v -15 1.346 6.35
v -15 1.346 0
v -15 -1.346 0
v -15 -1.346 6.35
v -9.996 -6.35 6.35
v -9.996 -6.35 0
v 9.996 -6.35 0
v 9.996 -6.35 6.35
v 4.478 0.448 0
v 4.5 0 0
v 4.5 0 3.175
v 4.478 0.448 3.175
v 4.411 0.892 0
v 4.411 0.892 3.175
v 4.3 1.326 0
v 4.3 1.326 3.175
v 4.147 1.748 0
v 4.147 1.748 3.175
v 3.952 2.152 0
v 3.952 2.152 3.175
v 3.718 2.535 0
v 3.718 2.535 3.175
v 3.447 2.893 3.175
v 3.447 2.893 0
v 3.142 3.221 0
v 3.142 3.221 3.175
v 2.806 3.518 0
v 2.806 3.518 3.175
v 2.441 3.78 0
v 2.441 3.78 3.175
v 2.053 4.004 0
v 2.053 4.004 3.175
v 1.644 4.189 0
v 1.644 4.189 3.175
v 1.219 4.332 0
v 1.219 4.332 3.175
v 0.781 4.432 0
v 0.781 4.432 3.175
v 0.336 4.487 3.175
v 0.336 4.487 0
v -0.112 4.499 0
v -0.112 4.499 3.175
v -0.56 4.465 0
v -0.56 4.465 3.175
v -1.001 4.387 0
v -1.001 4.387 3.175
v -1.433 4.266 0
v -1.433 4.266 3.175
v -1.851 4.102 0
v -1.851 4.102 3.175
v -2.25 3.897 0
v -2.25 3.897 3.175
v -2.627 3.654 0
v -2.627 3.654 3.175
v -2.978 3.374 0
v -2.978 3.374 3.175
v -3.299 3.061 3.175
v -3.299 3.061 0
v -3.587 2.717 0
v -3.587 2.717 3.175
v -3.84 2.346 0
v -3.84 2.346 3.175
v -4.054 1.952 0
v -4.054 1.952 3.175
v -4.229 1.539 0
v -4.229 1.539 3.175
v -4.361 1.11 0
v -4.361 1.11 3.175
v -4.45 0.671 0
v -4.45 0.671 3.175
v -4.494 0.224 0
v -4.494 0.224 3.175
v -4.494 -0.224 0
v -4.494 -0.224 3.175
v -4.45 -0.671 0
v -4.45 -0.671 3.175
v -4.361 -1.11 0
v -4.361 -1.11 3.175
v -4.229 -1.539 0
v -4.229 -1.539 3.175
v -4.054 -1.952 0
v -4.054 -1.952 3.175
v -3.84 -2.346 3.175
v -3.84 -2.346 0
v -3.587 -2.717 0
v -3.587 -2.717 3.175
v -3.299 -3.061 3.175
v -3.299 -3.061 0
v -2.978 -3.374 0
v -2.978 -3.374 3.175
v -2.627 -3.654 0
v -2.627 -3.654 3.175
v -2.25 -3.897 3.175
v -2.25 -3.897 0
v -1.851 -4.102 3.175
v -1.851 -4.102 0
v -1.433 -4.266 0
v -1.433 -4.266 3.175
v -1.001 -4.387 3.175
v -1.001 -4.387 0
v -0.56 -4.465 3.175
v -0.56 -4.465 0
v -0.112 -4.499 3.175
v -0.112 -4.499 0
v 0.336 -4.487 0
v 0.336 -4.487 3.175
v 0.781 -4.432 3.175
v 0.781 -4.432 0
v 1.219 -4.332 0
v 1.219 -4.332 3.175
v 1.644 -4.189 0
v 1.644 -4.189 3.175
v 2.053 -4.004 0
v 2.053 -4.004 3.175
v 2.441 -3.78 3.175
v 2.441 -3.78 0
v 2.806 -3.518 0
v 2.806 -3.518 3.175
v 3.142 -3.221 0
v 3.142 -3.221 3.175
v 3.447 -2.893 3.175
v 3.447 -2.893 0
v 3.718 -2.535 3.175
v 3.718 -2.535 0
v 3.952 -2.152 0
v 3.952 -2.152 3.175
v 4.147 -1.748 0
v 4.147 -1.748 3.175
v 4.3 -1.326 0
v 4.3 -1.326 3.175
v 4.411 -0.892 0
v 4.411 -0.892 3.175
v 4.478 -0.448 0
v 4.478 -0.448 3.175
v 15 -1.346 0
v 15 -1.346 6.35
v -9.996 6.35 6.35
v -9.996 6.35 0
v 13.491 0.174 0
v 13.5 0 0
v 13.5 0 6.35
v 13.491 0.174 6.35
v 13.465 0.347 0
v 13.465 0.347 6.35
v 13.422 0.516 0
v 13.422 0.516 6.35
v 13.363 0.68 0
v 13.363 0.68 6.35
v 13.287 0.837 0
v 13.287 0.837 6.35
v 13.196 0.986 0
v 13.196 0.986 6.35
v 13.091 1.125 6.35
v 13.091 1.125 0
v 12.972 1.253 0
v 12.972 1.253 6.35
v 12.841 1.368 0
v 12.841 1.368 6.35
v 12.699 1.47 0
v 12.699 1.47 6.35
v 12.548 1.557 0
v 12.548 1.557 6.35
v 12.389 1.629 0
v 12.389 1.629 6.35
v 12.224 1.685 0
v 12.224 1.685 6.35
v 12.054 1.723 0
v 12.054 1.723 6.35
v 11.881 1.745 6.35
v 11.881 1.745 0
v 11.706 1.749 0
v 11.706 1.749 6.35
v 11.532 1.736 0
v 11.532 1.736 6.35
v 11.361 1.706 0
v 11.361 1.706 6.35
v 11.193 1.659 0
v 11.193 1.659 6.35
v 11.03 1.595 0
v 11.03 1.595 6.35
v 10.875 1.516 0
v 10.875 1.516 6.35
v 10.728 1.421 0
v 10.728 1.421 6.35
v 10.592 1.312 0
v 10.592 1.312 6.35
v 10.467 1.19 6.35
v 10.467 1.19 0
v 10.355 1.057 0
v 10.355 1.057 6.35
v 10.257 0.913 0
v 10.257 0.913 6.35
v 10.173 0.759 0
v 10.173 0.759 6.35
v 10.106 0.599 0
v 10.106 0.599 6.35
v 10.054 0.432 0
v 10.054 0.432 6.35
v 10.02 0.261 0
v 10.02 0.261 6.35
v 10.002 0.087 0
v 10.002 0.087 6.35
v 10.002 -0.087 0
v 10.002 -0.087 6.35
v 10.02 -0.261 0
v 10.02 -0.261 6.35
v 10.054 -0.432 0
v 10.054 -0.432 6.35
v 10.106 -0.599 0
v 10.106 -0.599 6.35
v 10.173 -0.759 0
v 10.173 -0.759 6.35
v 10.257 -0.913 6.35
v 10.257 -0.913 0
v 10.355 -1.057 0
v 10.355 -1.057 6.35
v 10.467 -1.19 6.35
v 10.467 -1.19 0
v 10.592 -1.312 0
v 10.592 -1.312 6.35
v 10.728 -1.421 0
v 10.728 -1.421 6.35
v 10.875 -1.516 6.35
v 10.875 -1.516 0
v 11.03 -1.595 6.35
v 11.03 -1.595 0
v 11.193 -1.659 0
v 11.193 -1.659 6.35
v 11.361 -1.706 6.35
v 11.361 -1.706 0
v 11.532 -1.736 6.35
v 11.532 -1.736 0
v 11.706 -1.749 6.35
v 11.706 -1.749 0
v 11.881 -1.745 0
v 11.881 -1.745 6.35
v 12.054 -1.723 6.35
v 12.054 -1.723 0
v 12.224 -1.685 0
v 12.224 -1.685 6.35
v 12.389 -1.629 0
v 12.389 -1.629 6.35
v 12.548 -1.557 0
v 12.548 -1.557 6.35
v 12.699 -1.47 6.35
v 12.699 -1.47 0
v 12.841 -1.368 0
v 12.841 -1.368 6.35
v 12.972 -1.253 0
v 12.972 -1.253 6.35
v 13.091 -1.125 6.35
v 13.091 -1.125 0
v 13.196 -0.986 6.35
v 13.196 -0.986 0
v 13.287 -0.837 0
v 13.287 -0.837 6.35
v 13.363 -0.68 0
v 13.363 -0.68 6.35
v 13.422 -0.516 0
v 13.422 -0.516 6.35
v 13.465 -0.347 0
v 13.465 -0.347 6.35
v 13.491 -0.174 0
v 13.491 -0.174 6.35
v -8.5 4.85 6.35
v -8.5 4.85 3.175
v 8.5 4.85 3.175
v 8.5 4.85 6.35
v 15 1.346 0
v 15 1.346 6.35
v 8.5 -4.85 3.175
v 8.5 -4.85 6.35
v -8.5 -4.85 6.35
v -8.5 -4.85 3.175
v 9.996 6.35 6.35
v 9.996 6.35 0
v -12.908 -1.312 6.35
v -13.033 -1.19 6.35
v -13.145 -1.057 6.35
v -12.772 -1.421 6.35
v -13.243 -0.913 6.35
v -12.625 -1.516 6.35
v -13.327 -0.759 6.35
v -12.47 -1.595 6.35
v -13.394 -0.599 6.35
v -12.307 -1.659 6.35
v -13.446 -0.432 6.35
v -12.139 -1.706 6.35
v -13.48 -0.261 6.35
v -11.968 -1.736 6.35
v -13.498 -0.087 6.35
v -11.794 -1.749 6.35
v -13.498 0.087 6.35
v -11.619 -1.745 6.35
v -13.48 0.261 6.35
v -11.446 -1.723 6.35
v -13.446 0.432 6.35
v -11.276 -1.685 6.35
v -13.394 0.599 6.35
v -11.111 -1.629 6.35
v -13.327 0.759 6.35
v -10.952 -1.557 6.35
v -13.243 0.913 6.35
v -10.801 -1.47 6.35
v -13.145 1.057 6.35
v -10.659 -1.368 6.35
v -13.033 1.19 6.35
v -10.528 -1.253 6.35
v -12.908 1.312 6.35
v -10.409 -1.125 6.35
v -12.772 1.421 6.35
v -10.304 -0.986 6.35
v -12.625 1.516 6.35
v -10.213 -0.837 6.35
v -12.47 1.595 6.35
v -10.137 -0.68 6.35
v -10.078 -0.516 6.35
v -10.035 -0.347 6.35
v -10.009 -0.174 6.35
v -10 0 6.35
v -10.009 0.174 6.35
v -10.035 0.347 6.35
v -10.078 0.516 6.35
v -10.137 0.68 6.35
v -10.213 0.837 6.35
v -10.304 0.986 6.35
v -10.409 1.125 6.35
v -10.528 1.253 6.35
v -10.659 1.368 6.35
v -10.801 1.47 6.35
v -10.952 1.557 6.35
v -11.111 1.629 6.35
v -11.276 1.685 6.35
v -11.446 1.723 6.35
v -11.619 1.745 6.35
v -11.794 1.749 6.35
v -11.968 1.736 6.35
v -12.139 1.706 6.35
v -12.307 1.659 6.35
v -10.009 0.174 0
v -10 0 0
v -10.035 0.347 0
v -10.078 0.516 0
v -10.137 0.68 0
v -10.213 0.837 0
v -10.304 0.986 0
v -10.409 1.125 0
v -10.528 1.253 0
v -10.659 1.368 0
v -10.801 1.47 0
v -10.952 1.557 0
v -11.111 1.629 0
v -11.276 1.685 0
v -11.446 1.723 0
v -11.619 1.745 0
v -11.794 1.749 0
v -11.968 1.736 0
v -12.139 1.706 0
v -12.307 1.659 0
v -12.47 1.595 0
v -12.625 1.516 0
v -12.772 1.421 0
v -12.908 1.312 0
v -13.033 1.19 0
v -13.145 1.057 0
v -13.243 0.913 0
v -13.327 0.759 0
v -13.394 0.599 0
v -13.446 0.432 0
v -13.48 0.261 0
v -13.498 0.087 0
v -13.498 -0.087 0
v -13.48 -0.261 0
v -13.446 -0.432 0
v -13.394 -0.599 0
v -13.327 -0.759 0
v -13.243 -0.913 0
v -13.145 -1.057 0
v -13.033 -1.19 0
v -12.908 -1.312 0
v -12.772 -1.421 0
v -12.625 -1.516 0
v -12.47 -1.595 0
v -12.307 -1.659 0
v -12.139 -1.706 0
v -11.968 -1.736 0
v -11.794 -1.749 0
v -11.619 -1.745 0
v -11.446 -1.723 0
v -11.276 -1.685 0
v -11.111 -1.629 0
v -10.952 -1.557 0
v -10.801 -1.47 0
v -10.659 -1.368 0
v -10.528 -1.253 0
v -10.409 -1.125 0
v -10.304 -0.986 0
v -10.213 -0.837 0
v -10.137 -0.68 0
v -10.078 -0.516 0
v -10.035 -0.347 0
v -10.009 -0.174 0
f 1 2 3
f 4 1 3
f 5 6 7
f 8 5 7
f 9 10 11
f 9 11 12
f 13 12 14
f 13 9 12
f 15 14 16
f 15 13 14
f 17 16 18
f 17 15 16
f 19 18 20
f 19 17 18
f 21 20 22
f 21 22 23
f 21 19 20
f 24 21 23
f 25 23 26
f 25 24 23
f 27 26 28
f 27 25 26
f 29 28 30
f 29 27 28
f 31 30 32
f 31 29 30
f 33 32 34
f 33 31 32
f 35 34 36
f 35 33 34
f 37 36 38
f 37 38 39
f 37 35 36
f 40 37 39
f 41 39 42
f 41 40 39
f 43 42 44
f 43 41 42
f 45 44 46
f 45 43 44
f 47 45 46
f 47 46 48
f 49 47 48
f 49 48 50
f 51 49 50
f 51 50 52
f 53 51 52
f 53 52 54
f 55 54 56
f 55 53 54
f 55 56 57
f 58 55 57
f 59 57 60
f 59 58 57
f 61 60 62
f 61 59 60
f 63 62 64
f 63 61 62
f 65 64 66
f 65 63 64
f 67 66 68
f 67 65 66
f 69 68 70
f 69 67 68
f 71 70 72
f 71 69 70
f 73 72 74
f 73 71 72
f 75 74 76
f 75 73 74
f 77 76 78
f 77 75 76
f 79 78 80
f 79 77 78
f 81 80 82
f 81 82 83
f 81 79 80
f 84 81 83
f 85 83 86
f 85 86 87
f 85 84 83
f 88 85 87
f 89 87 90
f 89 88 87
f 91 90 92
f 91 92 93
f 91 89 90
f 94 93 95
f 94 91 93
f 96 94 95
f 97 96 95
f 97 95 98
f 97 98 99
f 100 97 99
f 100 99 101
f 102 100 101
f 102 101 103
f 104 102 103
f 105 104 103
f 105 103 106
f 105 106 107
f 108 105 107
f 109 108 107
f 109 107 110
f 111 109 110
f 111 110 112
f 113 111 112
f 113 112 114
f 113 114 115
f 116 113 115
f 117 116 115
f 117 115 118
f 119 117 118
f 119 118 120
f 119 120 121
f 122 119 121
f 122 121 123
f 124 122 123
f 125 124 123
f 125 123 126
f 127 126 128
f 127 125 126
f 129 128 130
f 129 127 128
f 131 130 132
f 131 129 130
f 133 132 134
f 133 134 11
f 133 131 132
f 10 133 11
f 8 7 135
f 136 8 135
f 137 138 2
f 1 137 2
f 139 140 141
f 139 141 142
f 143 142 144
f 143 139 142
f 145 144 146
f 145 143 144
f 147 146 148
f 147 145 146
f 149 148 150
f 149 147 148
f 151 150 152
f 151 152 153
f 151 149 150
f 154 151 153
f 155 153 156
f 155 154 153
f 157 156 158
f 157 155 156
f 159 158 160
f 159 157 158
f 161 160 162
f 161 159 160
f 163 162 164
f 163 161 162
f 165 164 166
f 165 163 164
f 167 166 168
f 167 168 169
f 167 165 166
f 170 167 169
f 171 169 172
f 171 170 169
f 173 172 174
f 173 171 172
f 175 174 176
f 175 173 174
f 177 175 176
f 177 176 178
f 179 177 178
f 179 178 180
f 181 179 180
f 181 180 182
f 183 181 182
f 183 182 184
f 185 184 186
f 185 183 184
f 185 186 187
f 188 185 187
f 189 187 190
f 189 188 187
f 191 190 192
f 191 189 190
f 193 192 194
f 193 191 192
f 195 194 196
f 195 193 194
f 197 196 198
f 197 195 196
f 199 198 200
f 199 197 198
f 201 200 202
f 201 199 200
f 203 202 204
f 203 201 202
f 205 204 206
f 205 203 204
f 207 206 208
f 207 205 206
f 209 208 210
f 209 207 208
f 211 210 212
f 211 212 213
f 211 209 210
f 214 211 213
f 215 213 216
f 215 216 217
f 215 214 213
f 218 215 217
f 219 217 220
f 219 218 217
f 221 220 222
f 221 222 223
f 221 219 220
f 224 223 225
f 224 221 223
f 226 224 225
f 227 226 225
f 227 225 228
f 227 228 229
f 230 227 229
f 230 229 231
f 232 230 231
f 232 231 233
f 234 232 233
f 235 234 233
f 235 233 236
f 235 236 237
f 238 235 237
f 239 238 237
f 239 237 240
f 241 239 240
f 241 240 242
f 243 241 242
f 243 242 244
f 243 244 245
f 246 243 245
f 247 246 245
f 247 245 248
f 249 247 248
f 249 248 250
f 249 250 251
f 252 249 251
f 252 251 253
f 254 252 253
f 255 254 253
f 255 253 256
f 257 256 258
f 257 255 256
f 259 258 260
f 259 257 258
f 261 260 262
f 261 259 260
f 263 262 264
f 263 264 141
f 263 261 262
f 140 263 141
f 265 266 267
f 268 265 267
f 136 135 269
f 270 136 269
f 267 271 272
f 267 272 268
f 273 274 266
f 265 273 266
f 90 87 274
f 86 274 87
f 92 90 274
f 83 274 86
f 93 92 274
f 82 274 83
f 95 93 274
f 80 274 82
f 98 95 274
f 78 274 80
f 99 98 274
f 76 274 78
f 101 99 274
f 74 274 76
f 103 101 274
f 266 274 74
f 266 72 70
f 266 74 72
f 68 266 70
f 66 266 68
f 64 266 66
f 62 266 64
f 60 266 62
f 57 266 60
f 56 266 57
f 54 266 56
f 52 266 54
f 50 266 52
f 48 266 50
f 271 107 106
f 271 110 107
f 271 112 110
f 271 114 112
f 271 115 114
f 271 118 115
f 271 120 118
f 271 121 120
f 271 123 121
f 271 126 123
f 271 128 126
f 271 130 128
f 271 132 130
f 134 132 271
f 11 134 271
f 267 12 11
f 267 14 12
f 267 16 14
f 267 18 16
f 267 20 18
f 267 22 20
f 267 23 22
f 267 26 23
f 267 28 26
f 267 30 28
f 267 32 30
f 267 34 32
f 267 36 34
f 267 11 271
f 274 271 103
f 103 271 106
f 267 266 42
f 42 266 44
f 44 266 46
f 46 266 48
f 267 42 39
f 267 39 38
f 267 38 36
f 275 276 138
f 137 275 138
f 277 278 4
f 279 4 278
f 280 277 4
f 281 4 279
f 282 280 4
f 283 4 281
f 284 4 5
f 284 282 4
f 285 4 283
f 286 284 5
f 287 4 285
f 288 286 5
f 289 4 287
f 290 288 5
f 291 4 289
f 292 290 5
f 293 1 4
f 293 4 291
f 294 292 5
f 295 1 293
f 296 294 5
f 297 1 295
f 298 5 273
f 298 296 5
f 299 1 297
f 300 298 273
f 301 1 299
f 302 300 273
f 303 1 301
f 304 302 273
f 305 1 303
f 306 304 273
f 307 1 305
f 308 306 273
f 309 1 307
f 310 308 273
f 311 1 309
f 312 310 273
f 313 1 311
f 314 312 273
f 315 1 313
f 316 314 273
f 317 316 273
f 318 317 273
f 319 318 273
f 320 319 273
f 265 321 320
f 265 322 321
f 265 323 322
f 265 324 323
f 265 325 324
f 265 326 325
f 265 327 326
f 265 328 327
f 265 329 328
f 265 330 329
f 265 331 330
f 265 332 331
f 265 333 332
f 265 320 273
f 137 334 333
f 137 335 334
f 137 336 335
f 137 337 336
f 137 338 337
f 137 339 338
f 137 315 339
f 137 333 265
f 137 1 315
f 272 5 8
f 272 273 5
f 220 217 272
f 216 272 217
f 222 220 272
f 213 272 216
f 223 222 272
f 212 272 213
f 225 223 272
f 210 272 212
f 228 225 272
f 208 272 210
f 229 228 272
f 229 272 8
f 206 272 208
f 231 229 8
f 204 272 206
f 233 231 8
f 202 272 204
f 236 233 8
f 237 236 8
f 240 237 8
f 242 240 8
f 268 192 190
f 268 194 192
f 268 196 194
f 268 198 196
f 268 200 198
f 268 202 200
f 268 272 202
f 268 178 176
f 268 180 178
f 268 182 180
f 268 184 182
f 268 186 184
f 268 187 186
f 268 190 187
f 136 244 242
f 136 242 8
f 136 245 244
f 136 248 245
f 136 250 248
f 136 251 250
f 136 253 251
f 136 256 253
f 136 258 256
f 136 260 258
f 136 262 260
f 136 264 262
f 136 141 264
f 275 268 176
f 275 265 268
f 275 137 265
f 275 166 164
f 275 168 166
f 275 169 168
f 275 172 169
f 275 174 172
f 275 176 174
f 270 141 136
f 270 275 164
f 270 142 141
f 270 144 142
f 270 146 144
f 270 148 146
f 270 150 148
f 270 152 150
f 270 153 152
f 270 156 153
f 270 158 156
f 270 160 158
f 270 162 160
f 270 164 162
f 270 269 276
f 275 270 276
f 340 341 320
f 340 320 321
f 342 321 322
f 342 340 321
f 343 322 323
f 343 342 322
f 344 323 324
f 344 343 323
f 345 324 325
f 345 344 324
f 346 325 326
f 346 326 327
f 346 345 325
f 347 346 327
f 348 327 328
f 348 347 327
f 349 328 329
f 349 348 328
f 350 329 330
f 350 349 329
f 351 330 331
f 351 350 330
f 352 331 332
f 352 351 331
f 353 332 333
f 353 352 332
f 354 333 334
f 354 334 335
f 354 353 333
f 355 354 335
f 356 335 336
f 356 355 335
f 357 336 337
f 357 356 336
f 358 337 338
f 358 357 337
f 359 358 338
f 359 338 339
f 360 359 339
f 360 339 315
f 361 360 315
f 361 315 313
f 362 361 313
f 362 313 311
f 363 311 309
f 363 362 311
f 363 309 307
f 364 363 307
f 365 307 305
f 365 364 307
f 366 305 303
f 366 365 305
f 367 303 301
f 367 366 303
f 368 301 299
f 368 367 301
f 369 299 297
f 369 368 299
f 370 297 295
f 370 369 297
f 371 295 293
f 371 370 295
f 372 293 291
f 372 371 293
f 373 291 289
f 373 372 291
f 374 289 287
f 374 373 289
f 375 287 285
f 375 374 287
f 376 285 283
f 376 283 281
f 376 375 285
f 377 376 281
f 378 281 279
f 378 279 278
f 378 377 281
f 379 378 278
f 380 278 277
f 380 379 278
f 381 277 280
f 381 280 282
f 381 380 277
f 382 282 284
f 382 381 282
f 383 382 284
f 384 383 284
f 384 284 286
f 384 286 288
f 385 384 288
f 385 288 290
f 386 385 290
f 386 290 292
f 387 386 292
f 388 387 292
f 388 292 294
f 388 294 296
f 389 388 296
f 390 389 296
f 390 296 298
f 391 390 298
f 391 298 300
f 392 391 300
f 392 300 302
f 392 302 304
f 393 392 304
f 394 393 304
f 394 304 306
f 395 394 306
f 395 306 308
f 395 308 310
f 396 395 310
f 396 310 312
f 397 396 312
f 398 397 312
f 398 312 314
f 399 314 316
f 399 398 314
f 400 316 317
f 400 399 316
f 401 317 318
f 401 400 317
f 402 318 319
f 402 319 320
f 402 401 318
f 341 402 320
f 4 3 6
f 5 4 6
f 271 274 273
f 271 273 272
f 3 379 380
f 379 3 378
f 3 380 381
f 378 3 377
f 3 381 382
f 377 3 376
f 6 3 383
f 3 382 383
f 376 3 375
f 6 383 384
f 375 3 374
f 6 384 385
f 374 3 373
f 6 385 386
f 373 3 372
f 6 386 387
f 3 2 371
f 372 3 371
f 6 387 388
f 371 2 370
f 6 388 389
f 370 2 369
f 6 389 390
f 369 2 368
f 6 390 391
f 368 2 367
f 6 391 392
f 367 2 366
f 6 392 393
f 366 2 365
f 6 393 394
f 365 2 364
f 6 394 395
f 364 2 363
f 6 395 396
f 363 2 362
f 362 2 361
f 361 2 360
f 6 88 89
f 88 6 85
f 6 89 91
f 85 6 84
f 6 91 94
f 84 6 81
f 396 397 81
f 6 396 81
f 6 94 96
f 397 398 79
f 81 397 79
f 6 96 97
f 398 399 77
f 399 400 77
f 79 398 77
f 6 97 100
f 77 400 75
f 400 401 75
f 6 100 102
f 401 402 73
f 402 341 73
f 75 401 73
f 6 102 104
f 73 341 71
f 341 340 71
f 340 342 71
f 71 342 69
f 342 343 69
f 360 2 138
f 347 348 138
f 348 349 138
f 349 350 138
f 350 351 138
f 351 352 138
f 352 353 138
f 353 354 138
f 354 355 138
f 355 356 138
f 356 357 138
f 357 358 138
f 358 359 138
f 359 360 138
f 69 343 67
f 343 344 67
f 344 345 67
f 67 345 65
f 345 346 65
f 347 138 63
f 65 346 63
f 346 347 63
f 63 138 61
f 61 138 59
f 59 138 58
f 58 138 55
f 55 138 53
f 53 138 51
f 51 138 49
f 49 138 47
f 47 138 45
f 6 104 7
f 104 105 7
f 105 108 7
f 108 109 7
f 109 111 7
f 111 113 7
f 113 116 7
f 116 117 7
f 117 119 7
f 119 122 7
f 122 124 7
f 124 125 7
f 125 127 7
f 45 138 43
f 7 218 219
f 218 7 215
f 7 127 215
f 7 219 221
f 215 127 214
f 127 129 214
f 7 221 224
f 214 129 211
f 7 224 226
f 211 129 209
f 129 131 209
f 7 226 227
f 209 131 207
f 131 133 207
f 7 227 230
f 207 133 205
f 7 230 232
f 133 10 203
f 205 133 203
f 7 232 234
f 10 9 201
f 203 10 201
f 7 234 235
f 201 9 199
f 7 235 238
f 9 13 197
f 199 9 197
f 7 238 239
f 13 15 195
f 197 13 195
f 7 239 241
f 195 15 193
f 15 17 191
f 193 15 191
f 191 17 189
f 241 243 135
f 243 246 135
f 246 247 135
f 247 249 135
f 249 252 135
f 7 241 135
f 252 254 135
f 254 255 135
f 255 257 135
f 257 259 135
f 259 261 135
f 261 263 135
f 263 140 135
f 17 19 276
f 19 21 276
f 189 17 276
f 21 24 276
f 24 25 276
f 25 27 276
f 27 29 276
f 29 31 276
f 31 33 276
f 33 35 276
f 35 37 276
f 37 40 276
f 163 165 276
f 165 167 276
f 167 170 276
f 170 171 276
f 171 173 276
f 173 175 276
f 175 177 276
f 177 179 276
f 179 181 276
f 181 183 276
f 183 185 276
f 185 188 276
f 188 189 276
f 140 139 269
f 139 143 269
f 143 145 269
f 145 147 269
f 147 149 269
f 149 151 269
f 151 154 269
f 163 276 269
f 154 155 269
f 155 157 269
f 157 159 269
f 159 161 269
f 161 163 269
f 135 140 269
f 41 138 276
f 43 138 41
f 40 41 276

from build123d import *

# Parameters (mm, degrees)
F0_R     = 1.75
F0_W     = 17
F0_H     = 9.7
F1_DEPTH = 6.35
F0_R_2   = 4.5
F2_DEPTH = 3.175


# Not quite as in the source:
# - a length typed as a fraction of an inch, garbled in the dataset ("3 / 203.2 mm" for 3/8 in), is restored


with BuildPart() as f1:
    # F0 (on Top) → F1 (new body)
    with BuildSketch(Plane.XY):
        Polygon((9.9961940777, 6.35), (-9.9961940777, 6.35), (-15, 1.3461940777), (-15, -1.3461940777), (-9.9961940777, -6.35), (9.9961940777, -6.35), (15, -1.3461940777), (15, 1.3461940777), align=None)
        with Locations((-11.75, 0)):
            Circle(F0_R, mode=Mode.SUBTRACT)
        Rectangle(F0_W, F0_H, mode=Mode.SUBTRACT)
        with Locations((11.75, 0)):
            Circle(F0_R, mode=Mode.SUBTRACT)
    extrude(amount=F1_DEPTH)

    # F0 (on Top) → F2 (join)
    with BuildSketch(Plane.XY):
        Rectangle(F0_W, F0_H)
        Circle(F0_R_2, mode=Mode.SUBTRACT)
    extrude(amount=F2_DEPTH)


solid = f1.part
